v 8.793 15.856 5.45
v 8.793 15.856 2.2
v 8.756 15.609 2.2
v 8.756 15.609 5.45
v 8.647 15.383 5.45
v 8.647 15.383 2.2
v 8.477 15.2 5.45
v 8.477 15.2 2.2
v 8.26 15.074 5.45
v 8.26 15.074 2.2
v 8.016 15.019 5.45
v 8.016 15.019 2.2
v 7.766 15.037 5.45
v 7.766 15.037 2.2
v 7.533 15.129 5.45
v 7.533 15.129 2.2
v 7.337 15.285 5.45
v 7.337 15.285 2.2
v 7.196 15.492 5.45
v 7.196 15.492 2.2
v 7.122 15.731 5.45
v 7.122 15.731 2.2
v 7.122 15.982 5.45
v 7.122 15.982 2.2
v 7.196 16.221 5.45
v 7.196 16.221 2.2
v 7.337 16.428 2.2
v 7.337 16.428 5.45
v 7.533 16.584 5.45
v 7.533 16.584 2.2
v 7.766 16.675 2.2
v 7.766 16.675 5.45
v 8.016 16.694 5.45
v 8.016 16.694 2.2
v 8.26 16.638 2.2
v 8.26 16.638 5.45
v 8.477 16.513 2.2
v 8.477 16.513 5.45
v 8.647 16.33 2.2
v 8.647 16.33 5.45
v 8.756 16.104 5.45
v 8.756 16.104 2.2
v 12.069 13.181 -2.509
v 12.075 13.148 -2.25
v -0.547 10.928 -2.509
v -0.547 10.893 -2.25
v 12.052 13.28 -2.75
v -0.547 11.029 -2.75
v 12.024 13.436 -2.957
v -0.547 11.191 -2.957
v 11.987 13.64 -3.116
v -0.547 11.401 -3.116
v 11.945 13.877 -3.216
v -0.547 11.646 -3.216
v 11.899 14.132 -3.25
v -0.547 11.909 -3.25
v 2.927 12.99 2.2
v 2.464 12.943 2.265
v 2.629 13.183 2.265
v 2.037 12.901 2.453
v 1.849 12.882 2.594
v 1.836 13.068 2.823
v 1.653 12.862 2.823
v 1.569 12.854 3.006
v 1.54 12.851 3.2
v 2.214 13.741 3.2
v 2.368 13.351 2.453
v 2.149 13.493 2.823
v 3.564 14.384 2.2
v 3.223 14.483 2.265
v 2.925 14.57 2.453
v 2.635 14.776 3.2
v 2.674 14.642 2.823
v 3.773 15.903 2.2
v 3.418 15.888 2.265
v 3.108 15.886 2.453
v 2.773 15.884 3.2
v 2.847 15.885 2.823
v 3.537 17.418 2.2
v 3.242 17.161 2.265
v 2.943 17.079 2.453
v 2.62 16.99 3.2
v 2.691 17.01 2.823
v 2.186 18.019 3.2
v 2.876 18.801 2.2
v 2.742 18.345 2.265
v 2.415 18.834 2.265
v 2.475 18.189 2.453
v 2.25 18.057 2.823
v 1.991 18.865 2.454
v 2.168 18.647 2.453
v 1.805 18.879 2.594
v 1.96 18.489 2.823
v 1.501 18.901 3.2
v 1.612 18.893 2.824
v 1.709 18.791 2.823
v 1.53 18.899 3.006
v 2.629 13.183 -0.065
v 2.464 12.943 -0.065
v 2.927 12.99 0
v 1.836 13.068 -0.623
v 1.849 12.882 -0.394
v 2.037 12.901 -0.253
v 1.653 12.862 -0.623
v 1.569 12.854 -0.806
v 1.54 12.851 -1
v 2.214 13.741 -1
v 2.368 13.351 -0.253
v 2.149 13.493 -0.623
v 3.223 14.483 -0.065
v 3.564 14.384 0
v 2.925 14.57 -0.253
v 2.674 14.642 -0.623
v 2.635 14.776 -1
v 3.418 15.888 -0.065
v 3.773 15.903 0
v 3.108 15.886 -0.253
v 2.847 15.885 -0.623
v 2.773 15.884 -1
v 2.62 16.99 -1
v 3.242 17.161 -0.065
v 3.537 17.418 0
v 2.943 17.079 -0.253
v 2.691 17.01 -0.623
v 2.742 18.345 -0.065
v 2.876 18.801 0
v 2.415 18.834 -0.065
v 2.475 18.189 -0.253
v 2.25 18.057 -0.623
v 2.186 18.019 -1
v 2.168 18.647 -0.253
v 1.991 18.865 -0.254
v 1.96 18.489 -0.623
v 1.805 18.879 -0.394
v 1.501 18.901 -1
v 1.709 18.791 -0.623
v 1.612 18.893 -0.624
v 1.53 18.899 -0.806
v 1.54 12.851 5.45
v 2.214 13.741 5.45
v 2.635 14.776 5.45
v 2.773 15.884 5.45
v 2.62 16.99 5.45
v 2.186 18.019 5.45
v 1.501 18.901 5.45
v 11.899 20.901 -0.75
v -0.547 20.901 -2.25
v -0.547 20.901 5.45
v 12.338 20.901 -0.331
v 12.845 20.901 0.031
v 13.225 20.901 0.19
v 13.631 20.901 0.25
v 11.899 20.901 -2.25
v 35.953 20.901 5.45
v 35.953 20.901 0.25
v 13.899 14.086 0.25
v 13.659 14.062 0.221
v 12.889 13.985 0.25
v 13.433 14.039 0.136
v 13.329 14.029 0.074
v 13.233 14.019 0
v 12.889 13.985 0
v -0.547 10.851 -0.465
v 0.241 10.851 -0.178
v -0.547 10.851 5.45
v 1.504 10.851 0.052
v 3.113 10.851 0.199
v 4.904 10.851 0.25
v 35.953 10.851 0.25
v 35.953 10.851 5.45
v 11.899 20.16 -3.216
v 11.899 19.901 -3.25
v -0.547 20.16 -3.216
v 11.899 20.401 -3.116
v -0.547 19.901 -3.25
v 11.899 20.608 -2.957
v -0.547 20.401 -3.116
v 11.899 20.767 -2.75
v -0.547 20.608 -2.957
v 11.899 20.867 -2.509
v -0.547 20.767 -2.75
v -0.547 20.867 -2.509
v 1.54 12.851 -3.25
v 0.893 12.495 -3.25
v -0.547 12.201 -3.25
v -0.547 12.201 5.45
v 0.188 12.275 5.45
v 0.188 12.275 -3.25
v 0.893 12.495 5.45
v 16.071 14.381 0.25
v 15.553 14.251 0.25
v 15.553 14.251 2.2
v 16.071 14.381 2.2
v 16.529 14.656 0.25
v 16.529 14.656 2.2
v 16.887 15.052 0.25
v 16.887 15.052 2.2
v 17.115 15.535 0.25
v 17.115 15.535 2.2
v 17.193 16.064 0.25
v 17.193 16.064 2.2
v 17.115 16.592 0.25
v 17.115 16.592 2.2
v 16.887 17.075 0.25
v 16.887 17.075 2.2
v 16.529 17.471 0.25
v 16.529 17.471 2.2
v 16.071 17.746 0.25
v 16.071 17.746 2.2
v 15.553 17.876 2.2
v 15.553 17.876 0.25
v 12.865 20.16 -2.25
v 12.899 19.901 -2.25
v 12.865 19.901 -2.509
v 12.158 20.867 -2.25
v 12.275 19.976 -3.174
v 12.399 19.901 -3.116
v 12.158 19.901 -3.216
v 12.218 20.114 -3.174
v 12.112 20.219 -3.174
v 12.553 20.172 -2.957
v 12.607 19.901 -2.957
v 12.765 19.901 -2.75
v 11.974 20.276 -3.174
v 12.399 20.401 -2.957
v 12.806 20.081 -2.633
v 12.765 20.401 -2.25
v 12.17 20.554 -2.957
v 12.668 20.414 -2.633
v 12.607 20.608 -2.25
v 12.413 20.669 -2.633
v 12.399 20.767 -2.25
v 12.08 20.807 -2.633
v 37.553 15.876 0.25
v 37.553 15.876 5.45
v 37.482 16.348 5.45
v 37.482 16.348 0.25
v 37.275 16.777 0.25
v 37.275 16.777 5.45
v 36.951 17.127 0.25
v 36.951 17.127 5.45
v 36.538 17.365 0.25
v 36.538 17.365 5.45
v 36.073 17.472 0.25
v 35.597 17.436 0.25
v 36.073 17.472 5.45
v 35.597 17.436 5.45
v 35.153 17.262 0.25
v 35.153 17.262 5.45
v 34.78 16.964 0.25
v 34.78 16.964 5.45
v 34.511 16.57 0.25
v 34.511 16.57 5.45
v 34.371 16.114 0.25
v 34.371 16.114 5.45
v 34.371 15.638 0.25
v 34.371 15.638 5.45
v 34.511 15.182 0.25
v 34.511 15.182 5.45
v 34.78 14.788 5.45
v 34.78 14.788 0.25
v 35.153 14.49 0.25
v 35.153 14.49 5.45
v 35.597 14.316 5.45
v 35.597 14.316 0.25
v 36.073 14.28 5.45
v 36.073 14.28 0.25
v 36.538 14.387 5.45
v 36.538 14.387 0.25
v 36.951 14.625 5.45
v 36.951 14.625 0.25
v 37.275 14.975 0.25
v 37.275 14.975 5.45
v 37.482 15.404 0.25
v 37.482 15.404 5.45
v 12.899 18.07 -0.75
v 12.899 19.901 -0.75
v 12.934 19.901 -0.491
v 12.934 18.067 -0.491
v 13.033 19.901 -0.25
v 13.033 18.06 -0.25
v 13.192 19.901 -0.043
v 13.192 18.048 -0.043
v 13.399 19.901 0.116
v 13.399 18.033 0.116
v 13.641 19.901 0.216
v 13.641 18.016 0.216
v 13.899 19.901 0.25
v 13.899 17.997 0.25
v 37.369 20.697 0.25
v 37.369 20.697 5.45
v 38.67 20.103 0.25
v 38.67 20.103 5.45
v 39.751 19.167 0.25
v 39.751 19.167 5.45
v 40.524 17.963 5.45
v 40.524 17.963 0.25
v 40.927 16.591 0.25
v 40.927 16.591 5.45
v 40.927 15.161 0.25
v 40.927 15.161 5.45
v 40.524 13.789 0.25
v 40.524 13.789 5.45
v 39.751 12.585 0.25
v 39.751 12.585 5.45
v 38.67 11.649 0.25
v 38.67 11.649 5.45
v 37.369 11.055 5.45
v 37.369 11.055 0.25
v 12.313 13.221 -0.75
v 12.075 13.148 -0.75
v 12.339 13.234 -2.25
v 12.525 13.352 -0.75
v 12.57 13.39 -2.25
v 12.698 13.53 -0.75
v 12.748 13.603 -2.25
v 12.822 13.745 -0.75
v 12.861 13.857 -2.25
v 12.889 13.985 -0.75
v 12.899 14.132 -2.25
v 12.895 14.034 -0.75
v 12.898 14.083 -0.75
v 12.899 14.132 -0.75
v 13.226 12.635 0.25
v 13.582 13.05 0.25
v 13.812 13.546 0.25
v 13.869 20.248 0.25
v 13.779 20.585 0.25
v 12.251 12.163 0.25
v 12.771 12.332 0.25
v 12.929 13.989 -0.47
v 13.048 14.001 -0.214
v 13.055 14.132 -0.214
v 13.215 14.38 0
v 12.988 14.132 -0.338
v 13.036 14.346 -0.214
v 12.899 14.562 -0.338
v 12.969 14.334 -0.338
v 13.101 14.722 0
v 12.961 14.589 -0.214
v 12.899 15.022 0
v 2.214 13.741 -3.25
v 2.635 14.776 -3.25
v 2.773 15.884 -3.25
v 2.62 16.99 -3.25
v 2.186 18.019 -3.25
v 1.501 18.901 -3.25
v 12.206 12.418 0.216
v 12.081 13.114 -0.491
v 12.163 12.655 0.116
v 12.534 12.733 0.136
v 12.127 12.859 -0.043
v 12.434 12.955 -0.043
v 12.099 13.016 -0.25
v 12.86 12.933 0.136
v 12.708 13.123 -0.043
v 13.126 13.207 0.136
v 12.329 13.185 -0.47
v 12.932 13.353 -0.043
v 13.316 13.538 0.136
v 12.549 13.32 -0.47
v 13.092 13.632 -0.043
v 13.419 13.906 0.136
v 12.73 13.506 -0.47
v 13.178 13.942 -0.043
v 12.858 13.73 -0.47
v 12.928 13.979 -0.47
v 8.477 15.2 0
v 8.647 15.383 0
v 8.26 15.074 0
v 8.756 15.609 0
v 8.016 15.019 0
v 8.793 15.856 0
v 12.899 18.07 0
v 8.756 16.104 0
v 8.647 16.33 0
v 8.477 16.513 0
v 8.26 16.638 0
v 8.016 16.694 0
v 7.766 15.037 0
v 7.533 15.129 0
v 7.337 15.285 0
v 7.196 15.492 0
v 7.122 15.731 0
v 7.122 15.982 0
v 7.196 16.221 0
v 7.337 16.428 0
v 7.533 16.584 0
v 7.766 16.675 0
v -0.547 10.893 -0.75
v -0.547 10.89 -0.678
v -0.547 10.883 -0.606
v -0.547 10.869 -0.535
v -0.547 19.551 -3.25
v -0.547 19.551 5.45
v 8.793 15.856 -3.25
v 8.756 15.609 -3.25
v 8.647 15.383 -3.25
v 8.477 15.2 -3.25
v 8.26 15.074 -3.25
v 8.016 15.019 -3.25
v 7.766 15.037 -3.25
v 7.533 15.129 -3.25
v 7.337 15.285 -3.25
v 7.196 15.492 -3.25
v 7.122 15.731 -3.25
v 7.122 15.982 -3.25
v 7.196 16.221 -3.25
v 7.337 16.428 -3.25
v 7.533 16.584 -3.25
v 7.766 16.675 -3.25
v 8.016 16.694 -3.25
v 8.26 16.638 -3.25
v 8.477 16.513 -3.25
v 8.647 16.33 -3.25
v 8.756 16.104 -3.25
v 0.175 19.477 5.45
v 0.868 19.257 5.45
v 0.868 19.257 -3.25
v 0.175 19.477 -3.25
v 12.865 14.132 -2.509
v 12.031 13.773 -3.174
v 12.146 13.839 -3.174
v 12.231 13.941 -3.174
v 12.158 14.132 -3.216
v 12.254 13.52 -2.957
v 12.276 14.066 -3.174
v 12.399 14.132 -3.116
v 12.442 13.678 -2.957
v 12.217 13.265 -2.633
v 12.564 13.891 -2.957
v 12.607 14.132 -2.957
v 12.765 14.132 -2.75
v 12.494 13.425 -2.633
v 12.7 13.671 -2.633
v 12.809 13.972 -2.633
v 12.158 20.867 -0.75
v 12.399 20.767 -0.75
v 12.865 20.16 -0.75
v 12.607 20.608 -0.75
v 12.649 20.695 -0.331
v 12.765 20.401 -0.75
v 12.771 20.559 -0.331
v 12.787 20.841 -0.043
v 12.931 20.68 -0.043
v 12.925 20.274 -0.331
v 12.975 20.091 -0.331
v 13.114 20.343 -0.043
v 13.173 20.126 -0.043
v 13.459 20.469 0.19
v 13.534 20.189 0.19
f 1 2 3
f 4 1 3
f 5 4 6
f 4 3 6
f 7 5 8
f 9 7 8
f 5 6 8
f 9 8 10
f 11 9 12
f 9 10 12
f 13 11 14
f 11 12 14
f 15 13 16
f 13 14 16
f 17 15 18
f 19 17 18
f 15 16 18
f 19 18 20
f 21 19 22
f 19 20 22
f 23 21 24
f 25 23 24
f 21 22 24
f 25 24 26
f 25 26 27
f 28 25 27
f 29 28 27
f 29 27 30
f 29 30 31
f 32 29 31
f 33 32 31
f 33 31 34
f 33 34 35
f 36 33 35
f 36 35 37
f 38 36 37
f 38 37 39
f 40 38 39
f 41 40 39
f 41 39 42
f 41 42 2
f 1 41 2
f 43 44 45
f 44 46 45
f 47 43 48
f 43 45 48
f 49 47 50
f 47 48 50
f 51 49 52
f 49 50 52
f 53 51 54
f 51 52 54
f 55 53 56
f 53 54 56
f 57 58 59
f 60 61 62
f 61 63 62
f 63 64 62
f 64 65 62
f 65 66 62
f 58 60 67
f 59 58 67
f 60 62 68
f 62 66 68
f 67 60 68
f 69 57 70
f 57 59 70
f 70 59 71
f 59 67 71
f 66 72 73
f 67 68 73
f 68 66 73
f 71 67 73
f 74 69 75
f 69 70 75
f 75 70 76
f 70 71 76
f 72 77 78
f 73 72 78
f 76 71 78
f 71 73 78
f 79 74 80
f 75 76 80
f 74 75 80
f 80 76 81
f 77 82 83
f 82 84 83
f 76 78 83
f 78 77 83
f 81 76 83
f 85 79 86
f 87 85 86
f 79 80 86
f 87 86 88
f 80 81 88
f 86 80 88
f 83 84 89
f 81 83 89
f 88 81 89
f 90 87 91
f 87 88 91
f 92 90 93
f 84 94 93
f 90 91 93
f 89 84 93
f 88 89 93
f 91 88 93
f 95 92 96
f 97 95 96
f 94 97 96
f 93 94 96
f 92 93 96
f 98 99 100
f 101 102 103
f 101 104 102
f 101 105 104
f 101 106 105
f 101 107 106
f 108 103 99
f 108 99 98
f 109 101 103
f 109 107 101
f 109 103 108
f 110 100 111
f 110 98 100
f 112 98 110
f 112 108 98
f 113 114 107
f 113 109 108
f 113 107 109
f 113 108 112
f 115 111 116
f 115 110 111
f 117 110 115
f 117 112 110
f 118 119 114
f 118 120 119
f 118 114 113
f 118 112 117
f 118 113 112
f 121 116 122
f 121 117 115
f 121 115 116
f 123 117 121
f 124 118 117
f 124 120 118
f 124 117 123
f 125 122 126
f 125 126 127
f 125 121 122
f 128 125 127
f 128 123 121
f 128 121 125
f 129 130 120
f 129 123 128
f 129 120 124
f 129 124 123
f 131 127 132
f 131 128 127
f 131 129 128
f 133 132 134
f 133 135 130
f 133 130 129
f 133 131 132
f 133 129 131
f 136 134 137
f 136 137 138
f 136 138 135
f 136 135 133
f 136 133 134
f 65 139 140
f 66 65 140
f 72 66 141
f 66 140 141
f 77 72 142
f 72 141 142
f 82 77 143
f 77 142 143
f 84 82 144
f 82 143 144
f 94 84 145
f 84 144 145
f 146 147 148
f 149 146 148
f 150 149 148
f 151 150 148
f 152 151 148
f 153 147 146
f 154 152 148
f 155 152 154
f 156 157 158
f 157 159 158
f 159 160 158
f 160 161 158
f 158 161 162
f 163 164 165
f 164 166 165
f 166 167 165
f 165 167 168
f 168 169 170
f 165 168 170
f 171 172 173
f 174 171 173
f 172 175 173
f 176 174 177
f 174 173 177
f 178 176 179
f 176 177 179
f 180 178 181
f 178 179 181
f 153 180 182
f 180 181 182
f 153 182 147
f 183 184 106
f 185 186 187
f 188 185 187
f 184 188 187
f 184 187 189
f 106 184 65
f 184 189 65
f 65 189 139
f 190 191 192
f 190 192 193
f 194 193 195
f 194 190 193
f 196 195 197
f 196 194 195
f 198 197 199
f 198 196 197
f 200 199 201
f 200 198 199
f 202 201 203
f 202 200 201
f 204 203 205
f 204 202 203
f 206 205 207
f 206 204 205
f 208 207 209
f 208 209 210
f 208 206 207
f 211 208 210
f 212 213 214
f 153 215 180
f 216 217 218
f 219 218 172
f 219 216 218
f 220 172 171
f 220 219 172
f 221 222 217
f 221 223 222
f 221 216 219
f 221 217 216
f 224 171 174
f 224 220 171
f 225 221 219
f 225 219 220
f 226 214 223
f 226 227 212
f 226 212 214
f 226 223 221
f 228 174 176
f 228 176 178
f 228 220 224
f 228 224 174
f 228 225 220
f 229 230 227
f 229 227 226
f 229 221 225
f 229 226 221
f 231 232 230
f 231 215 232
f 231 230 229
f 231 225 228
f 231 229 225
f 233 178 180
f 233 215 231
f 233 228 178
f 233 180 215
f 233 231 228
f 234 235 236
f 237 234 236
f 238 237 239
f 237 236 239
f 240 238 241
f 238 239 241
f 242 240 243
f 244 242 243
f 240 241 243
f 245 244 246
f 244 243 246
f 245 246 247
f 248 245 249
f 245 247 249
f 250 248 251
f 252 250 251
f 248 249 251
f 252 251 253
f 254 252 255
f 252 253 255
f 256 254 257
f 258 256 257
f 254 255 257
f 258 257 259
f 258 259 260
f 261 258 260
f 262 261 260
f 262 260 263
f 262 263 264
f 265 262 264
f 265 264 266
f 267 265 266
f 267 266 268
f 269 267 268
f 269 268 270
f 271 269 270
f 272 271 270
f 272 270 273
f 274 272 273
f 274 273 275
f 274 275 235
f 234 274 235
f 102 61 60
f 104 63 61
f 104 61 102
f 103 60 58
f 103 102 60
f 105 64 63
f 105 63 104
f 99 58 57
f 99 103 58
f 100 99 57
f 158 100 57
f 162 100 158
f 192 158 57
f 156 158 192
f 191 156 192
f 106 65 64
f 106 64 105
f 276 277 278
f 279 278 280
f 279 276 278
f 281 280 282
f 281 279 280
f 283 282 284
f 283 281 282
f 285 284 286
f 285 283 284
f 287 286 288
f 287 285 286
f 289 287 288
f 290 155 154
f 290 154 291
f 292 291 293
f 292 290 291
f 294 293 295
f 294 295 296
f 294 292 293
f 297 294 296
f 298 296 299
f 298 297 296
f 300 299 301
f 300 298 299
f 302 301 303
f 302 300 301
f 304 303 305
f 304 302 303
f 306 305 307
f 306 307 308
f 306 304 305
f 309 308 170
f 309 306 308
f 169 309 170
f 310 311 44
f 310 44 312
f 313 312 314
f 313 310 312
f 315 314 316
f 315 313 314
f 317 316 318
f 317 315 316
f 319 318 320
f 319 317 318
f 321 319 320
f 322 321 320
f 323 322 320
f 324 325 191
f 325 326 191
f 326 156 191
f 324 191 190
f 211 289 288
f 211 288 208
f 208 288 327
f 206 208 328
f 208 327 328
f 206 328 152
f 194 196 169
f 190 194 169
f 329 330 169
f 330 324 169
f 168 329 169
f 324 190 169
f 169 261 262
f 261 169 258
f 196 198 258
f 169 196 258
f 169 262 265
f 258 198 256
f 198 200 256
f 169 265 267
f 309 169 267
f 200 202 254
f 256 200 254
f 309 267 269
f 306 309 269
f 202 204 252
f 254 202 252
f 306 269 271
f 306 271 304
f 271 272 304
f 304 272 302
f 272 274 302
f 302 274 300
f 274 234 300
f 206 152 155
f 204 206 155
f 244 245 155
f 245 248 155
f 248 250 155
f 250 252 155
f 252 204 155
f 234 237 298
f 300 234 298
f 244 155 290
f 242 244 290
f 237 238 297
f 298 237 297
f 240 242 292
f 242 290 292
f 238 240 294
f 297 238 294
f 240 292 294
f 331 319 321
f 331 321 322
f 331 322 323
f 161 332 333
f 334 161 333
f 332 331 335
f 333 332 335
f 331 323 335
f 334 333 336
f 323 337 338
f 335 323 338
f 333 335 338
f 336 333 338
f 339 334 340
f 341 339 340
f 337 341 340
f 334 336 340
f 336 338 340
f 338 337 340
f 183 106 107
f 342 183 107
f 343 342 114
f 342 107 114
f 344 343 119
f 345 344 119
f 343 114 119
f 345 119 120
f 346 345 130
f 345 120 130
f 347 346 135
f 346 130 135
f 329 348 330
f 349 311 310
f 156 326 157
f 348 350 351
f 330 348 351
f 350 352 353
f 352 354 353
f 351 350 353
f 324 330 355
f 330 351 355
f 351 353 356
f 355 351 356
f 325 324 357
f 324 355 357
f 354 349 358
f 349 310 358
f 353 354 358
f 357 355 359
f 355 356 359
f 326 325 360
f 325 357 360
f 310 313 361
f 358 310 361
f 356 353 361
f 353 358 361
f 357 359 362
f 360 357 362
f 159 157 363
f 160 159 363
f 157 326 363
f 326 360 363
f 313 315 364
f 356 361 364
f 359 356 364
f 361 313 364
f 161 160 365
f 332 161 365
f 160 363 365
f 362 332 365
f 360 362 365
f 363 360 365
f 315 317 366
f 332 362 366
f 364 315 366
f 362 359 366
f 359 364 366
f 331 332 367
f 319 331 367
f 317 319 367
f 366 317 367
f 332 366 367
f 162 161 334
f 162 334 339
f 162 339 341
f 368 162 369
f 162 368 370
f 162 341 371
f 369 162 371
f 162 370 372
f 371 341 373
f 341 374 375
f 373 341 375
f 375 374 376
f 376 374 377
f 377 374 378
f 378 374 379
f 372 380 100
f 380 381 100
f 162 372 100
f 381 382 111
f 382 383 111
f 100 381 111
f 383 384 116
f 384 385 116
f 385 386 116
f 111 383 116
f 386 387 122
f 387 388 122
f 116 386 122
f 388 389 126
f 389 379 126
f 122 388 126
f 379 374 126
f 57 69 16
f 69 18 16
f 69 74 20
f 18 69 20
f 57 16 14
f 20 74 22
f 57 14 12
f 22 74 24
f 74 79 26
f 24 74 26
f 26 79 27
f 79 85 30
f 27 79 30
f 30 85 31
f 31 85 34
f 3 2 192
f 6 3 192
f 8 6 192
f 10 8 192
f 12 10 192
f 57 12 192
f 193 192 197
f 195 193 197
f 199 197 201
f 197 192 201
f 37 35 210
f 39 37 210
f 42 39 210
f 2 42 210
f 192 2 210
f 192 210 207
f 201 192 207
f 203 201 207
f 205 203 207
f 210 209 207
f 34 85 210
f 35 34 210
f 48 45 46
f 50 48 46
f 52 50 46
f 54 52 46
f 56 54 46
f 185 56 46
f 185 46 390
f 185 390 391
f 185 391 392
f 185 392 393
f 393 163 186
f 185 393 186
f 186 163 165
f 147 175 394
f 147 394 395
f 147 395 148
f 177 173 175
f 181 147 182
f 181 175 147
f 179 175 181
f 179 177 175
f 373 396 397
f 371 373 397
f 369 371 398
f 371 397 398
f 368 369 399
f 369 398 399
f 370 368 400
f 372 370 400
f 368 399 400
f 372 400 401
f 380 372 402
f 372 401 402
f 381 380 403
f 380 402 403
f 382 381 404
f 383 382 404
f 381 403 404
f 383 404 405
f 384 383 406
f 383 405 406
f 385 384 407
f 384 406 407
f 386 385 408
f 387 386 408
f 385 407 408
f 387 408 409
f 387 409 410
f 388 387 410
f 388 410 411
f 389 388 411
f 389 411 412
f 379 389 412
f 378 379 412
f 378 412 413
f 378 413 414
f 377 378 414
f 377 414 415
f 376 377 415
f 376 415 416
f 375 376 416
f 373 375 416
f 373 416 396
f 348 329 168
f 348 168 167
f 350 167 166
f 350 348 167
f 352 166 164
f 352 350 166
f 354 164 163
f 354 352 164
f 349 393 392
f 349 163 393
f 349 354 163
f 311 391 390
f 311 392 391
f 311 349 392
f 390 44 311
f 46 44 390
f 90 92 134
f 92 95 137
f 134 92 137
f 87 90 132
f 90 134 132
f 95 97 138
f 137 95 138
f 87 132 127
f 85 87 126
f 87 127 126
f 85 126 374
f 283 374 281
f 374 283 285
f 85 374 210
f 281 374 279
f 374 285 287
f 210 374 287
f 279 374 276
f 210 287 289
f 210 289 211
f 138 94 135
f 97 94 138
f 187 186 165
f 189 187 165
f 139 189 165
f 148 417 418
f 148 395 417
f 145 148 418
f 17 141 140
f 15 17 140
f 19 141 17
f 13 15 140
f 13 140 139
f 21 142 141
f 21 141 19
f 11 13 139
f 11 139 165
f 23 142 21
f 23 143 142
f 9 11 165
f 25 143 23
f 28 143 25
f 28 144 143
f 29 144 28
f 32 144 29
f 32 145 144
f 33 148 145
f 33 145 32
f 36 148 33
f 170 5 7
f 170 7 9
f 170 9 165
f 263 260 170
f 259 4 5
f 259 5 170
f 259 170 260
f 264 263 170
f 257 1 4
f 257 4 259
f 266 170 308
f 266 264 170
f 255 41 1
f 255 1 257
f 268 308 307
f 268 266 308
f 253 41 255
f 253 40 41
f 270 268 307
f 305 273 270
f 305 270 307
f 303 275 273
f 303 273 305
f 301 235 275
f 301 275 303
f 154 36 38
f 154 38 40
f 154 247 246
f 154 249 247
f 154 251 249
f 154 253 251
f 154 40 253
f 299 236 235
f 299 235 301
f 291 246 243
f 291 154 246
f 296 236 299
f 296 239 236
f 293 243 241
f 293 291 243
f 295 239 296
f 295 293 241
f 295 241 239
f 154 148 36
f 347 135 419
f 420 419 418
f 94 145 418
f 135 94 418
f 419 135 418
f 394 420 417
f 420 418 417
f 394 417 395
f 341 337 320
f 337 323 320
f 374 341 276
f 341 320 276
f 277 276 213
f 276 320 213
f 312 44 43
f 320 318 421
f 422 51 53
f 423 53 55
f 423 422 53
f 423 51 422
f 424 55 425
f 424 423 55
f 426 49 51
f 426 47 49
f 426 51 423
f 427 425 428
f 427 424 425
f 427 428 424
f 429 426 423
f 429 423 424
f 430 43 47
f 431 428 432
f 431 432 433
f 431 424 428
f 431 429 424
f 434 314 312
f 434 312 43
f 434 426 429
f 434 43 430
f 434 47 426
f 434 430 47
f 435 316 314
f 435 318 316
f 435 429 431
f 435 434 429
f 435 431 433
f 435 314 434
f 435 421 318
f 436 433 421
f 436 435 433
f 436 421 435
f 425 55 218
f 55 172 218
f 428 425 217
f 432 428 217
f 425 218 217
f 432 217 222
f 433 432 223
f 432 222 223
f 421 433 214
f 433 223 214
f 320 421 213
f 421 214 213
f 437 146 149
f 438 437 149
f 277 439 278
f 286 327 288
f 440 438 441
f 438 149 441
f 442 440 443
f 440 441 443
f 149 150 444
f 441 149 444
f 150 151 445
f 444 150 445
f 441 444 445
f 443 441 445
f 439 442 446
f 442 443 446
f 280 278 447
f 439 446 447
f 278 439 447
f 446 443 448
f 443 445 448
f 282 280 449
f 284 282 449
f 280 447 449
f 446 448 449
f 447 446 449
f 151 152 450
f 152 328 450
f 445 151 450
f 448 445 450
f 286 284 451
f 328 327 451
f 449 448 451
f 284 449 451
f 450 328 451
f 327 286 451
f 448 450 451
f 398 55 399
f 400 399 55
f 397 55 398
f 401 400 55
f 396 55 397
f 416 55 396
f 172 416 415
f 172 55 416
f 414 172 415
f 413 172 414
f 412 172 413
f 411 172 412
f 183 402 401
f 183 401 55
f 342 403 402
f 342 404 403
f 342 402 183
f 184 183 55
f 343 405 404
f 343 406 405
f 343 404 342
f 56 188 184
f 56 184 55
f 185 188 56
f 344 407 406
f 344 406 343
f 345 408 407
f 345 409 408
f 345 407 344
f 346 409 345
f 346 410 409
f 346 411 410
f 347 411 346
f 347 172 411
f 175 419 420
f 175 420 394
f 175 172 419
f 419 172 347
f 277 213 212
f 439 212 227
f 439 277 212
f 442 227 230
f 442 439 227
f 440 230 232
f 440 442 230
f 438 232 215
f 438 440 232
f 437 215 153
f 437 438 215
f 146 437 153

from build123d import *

# Parameters (mm, degrees)
EXTRUDE_1_DEPTH     = 2.2
SKETCH_2_W          = 36.5
SKETCH_2_H          = 10.05
EXTRUDE_2_DEPTH     = 3.25
SKETCH_3_W          = 36.5
SKETCH_3_H          = 10.05
EXTRUDE_3_DEPTH     = 3.25
CUT_EXTRUDE_1_DEPTH = 30
SKETCH_6_R          = 5.025
EXTRUDE_4_DEPTH     = 8.7
SKETCH_8_R          = 1.675
SKETCH_8_R_2        = 0.84
CUT_EXTRUDE_3_DEPTH = 55
SKETCH_9_W          = 53.416465659
SKETCH_9_H          = 14.532409192
CUT_EXTRUDE_4_DEPTH = 3.5
SKETCH_10_R         = 1.6
CUT_EXTRUDE_5_DEPTH = 10
CUT_EXTRUDE_6_DEPTH = 3.5
FILLET_1_R          = 1
FILLET_2_R          = 1
FILLET_3_R          = 1


with BuildPart() as part:
    # 草图1 → 凸台-拉伸1 (new body)
    with BuildSketch(Plane.XY):
        with BuildLine():
            Line((1.539836705, 12.851012384), (15.55297303, 14.251012384))
            ThreePointArc((15.55297303, 14.251012384), (17.193415997, 16.063512384), (15.55297303, 17.876012384))
            Line((15.55297303, 17.876012384), (1.500532553, 18.901012384))
            ThreePointArc((1.500532553, 18.901012384), (0.527100583, 19.384612538), (-0.54702697, 19.551012384))
            Line((-0.54702697, 19.551012384), (-0.54702697, 20.901012384))
            Line((-0.54702697, 20.901012384), (19.51277613, 20.901012384))
            Line((19.51277613, 20.901012384), (35.95297303, 20.901012384))
            Line((35.95297303, 20.901012384), (35.95297303, 10.851012384))
            Line((35.95297303, 10.851012384), (-0.54702697, 10.851012384))
            Line((-0.54702697, 10.851012384), (-0.54702697, 12.201012384))
            ThreePointArc((-0.54702697, 12.201012384), (0.54584768, 12.367273294), (1.539836705, 12.851012384))
        make_face()
    extrude(amount=EXTRUDE_1_DEPTH)

    # 草图2 → 凸台-拉伸2 (add)
    with BuildSketch(Plane(origin=(0, 0, 0), x_dir=(-1, 0, 0), z_dir=(0, 0, -1))):
        with Locations((-17.70297303, 15.876012384)):
            Rectangle(SKETCH_2_W, SKETCH_2_H)
    extrude(amount=EXTRUDE_2_DEPTH)

    # 草图3 → 凸台-拉伸3 (add)
    with BuildSketch(Plane.XY.offset(2.2)):
        with Locations((17.70297303, 15.876012384)):
            Rectangle(SKETCH_3_W, SKETCH_3_H)
    extrude(amount=EXTRUDE_3_DEPTH)

    # 草图4 → 切除-拉伸1 (cut, symmetric)
    with BuildSketch(Plane.XY):
        with BuildLine():
            Line((-0.54702697, 19.551012384), (-2.235397712, 16.616091152))
            Line((-2.235397712, 16.616091152), (-1.110896638, 12.310548833))
            Line((-1.110896638, 12.310548833), (-0.54702697, 12.201012384))
            ThreePointArc((-0.54702697, 12.201012384), (0.54584768, 12.367273294), (1.539836705, 12.851012384))
            ThreePointArc((1.539836705, 12.851012384), (2.773180655, 15.88415254), (1.500532553, 18.901012384))
            ThreePointArc((1.500532553, 18.901012384), (0.527100583, 19.384612538), (-0.54702697, 19.551012384))
        make_face()
    extrude(amount=CUT_EXTRUDE_1_DEPTH, both=True, mode=Mode.SUBTRACT)

    # 草图6 → 凸台-拉伸4 (add)
    with BuildSketch(Plane(origin=(0, 0, -3.25), x_dir=(-1, 0, 0), z_dir=(0, 0, -1))):
        with Locations((-35.95297303, 15.876012384)):
            Circle(SKETCH_6_R)
    extrude(amount=-EXTRUDE_4_DEPTH)

    # 草图8 → 切除-拉伸3 (cut)
    with BuildSketch(Plane(origin=(0, 0, -3.25), x_dir=(-1, 0, 0), z_dir=(0, 0, -1))):
        with Locations((-49.45297303, 15.876012384)):
            Circle(SKETCH_8_R)
        with Locations(Location((-7.95297303, 15.856360308, 0), (0, 0, 180))):
            Circle(SKETCH_8_R_2)
    extrude(amount=-CUT_EXTRUDE_3_DEPTH, mode=Mode.SUBTRACT)

    # 草图9 → 切除-拉伸4 (cut)
    with BuildSketch(Plane(origin=(0, 0, -3.25), x_dir=(-1, 0, 0), z_dir=(0, 0, -1))):
        with Locations((-39.607660409, 15.039406696)):
            Rectangle(SKETCH_9_W, SKETCH_9_H)
    extrude(amount=-CUT_EXTRUDE_4_DEPTH, mode=Mode.SUBTRACT)

    # 草图10 → 切除-拉伸5 (cut)
    with BuildSketch(Plane.XY.offset(5.45)):
        with Locations((35.95297303, 15.876012384)):
            Circle(SKETCH_10_R)
    extrude(amount=-CUT_EXTRUDE_5_DEPTH, mode=Mode.SUBTRACT)

    # 草图11 → 切除-拉伸6 (cut)
    with BuildSketch(Plane(origin=(0, 0, -3.25), x_dir=(-1, 0, 0), z_dir=(0, 0, -1))):
        Polygon((-12.89942758, 13.294850275), (0.782882432, 10.851012384), (0, 8.730799831), (-15.448021962, 9.415407398), align=None)
    extrude(amount=-CUT_EXTRUDE_6_DEPTH, mode=Mode.SUBTRACT)

    # 圆角1
    fillet_1_edges = [part.edges().sort_by_distance(p)[0] for p in [
        (12.89942758, 20.901012384, -1.5),
        (12.89942758, 13.294850275, -1.5),
        (6.176200305, 12.093994751, -3.25),
        (12.89942758, 17.09793133, -3.25),
        (6.176200305, 20.901012384, -3.25),
    ]]
    fillet(fillet_1_edges, radius=FILLET_1_R)

    # 圆角2
    # the kernel refuses this fillet: 1 mm, written as the material it adds along each edge
    with BuildSketch(Plane(origin=(11.89942758, 14.132063378, 0.25), x_dir=(0.17583025935665297, -0.9844204995298362, 0), z_dir=(-0.9844204995298362, -0.17583025935665297, 0))) as fillet_2_piece_1_section:
        with BuildLine():
            CenterArc((1 + FILLET_2_R, -FILLET_2_R), FILLET_2_R, 90, 90)
            Line((1, -FILLET_2_R), (1, 0))
            Line((1, 0), (1 + FILLET_2_R, 0))
        make_face()
    fillet_2_piece_1 = revolve(axis=Axis((11.89942758, 14.132063378, 0.25), (0, 0, 1)), revolution_arc=214.681339144, mode=Mode.PRIVATE)
    fillet_2_piece_1 = split(fillet_2_piece_1, bisect_by=Plane(origin=(12.386461292, 13.934658048, 0.148039327), z_dir=(0.0994113635758644, -0.9950464214256476, 0)), keep=Keep.TOP, mode=Mode.PRIVATE)
    add(fillet_2_piece_1)
    with BuildSketch(Plane(origin=(11.89942758, 14.132063378, 0.25), x_dir=(0.17583025935665297, -0.9844204995298362, 0), z_dir=(-0.9844204995298362, -0.17583025935665297, 0))) as fillet_2_piece_2_section:
        with BuildLine():
            CenterArc((1 + FILLET_2_R, -FILLET_2_R), FILLET_2_R, 90, 90)
            Line((1, -FILLET_2_R), (1, 0))
            Line((1, 0), (1 + FILLET_2_R, 0))
        make_face()
    fillet_2_piece_2 = revolve(axis=Axis((11.89942758, 14.132063378, 0.25), (0, 0, 1)), revolution_arc=214.681339144, mode=Mode.PRIVATE)
    fillet_2_piece_2 = split(fillet_2_piece_2, bisect_by=Plane(origin=(12.896125684, 14.022775497, 0), z_dir=(0, 0, -1)), keep=Keep.TOP, mode=Mode.PRIVATE)
    add(fillet_2_piece_2)
    with BuildSketch(Plane(origin=(12.07525784, 13.147642879, 0.25), x_dir=(0, 0, -1), z_dir=(-0.984420499529836, -0.17583025935665386, 0))) as fillet_2_piece_3_section:
        with BuildLine():
            CenterArc((FILLET_2_R, FILLET_2_R), FILLET_2_R, 180, 90)
            Line((0, FILLET_2_R), (0, 0))
            Line((0, 0), (FILLET_2_R, 0))
        make_face()
    fillet_2_piece_3 = extrude(amount=15.32204588, mode=Mode.PRIVATE)
    fillet_2_piece_3 = split(fillet_2_piece_3, bisect_by=Plane(origin=(-0.54702697, 11.899303342, 0.017148227), z_dir=(1, 0, 0)), keep=Keep.TOP, mode=Mode.PRIVATE)
    fillet_2_piece_3 = split(fillet_2_piece_3, bisect_by=Plane(origin=(6.26358972, 10.851012384, 0.017148227), z_dir=(0, 1, 0)), keep=Keep.TOP, mode=Mode.PRIVATE)
    add(fillet_2_piece_3)
    with BuildSketch(Plane(origin=(11.89942758, 19.901012384, 0.25), x_dir=(-0.5976672776328282, -0.8017442392976477, 0), z_dir=(0.8017442392976477, -0.5976672776328282, 0))) as fillet_2_piece_4_section:
        with BuildLine():
            CenterArc((1 + FILLET_2_R, FILLET_2_R), FILLET_2_R, 180, 90)
            Line((1 + FILLET_2_R, 0), (1, 0))
            Line((1, 0), (1, FILLET_2_R))
        make_face()
    fillet_2_piece_4 = revolve(axis=Axis((11.89942758, 19.901012384, 0.25), (0, 0, -1)), revolution_arc=233.296989237, mode=Mode.PRIVATE)
    fillet_2_piece_4 = split(fillet_2_piece_4, bisect_by=Plane(origin=(12.649366525, 20.901012384, -0.061628308), z_dir=(0, -1, 0)), keep=Keep.TOP, mode=Mode.PRIVATE)
    add(fillet_2_piece_4)
    with BuildSketch(Plane(origin=(12.89942758, 15.56956482, 0.25), x_dir=(0, 0, -1), z_dir=(0, 1, 0))) as fillet_2_piece_5_section:
        with BuildLine():
            CenterArc((FILLET_2_R, -FILLET_2_R), FILLET_2_R, 90, 90)
            Line((0, -FILLET_2_R), (0, 0))
            Line((0, 0), (FILLET_2_R, 0))
        make_face()
    fillet_2_piece_5 = extrude(amount=4.331447564, mode=Mode.PRIVATE)
    fillet_2_piece_5 = split(fillet_2_piece_5, bisect_by=Plane(origin=(12.930705697, 18.067283361, -0.180311335), z_dir=(0.0727477998867751, 0.9973503685323598, 0)), keep=Keep.TOP, mode=Mode.PRIVATE)
    add(fillet_2_piece_5)

    # 圆角3
    fillet_3_edges = [part.edges().sort_by_distance(p)[0] for p in [
        (2.773180655, 15.88415254, 0),
        (2.773180655, 15.88415254, 2.2),
    ]]
    fillet(fillet_3_edges, radius=FILLET_3_R)


solid = part.part
